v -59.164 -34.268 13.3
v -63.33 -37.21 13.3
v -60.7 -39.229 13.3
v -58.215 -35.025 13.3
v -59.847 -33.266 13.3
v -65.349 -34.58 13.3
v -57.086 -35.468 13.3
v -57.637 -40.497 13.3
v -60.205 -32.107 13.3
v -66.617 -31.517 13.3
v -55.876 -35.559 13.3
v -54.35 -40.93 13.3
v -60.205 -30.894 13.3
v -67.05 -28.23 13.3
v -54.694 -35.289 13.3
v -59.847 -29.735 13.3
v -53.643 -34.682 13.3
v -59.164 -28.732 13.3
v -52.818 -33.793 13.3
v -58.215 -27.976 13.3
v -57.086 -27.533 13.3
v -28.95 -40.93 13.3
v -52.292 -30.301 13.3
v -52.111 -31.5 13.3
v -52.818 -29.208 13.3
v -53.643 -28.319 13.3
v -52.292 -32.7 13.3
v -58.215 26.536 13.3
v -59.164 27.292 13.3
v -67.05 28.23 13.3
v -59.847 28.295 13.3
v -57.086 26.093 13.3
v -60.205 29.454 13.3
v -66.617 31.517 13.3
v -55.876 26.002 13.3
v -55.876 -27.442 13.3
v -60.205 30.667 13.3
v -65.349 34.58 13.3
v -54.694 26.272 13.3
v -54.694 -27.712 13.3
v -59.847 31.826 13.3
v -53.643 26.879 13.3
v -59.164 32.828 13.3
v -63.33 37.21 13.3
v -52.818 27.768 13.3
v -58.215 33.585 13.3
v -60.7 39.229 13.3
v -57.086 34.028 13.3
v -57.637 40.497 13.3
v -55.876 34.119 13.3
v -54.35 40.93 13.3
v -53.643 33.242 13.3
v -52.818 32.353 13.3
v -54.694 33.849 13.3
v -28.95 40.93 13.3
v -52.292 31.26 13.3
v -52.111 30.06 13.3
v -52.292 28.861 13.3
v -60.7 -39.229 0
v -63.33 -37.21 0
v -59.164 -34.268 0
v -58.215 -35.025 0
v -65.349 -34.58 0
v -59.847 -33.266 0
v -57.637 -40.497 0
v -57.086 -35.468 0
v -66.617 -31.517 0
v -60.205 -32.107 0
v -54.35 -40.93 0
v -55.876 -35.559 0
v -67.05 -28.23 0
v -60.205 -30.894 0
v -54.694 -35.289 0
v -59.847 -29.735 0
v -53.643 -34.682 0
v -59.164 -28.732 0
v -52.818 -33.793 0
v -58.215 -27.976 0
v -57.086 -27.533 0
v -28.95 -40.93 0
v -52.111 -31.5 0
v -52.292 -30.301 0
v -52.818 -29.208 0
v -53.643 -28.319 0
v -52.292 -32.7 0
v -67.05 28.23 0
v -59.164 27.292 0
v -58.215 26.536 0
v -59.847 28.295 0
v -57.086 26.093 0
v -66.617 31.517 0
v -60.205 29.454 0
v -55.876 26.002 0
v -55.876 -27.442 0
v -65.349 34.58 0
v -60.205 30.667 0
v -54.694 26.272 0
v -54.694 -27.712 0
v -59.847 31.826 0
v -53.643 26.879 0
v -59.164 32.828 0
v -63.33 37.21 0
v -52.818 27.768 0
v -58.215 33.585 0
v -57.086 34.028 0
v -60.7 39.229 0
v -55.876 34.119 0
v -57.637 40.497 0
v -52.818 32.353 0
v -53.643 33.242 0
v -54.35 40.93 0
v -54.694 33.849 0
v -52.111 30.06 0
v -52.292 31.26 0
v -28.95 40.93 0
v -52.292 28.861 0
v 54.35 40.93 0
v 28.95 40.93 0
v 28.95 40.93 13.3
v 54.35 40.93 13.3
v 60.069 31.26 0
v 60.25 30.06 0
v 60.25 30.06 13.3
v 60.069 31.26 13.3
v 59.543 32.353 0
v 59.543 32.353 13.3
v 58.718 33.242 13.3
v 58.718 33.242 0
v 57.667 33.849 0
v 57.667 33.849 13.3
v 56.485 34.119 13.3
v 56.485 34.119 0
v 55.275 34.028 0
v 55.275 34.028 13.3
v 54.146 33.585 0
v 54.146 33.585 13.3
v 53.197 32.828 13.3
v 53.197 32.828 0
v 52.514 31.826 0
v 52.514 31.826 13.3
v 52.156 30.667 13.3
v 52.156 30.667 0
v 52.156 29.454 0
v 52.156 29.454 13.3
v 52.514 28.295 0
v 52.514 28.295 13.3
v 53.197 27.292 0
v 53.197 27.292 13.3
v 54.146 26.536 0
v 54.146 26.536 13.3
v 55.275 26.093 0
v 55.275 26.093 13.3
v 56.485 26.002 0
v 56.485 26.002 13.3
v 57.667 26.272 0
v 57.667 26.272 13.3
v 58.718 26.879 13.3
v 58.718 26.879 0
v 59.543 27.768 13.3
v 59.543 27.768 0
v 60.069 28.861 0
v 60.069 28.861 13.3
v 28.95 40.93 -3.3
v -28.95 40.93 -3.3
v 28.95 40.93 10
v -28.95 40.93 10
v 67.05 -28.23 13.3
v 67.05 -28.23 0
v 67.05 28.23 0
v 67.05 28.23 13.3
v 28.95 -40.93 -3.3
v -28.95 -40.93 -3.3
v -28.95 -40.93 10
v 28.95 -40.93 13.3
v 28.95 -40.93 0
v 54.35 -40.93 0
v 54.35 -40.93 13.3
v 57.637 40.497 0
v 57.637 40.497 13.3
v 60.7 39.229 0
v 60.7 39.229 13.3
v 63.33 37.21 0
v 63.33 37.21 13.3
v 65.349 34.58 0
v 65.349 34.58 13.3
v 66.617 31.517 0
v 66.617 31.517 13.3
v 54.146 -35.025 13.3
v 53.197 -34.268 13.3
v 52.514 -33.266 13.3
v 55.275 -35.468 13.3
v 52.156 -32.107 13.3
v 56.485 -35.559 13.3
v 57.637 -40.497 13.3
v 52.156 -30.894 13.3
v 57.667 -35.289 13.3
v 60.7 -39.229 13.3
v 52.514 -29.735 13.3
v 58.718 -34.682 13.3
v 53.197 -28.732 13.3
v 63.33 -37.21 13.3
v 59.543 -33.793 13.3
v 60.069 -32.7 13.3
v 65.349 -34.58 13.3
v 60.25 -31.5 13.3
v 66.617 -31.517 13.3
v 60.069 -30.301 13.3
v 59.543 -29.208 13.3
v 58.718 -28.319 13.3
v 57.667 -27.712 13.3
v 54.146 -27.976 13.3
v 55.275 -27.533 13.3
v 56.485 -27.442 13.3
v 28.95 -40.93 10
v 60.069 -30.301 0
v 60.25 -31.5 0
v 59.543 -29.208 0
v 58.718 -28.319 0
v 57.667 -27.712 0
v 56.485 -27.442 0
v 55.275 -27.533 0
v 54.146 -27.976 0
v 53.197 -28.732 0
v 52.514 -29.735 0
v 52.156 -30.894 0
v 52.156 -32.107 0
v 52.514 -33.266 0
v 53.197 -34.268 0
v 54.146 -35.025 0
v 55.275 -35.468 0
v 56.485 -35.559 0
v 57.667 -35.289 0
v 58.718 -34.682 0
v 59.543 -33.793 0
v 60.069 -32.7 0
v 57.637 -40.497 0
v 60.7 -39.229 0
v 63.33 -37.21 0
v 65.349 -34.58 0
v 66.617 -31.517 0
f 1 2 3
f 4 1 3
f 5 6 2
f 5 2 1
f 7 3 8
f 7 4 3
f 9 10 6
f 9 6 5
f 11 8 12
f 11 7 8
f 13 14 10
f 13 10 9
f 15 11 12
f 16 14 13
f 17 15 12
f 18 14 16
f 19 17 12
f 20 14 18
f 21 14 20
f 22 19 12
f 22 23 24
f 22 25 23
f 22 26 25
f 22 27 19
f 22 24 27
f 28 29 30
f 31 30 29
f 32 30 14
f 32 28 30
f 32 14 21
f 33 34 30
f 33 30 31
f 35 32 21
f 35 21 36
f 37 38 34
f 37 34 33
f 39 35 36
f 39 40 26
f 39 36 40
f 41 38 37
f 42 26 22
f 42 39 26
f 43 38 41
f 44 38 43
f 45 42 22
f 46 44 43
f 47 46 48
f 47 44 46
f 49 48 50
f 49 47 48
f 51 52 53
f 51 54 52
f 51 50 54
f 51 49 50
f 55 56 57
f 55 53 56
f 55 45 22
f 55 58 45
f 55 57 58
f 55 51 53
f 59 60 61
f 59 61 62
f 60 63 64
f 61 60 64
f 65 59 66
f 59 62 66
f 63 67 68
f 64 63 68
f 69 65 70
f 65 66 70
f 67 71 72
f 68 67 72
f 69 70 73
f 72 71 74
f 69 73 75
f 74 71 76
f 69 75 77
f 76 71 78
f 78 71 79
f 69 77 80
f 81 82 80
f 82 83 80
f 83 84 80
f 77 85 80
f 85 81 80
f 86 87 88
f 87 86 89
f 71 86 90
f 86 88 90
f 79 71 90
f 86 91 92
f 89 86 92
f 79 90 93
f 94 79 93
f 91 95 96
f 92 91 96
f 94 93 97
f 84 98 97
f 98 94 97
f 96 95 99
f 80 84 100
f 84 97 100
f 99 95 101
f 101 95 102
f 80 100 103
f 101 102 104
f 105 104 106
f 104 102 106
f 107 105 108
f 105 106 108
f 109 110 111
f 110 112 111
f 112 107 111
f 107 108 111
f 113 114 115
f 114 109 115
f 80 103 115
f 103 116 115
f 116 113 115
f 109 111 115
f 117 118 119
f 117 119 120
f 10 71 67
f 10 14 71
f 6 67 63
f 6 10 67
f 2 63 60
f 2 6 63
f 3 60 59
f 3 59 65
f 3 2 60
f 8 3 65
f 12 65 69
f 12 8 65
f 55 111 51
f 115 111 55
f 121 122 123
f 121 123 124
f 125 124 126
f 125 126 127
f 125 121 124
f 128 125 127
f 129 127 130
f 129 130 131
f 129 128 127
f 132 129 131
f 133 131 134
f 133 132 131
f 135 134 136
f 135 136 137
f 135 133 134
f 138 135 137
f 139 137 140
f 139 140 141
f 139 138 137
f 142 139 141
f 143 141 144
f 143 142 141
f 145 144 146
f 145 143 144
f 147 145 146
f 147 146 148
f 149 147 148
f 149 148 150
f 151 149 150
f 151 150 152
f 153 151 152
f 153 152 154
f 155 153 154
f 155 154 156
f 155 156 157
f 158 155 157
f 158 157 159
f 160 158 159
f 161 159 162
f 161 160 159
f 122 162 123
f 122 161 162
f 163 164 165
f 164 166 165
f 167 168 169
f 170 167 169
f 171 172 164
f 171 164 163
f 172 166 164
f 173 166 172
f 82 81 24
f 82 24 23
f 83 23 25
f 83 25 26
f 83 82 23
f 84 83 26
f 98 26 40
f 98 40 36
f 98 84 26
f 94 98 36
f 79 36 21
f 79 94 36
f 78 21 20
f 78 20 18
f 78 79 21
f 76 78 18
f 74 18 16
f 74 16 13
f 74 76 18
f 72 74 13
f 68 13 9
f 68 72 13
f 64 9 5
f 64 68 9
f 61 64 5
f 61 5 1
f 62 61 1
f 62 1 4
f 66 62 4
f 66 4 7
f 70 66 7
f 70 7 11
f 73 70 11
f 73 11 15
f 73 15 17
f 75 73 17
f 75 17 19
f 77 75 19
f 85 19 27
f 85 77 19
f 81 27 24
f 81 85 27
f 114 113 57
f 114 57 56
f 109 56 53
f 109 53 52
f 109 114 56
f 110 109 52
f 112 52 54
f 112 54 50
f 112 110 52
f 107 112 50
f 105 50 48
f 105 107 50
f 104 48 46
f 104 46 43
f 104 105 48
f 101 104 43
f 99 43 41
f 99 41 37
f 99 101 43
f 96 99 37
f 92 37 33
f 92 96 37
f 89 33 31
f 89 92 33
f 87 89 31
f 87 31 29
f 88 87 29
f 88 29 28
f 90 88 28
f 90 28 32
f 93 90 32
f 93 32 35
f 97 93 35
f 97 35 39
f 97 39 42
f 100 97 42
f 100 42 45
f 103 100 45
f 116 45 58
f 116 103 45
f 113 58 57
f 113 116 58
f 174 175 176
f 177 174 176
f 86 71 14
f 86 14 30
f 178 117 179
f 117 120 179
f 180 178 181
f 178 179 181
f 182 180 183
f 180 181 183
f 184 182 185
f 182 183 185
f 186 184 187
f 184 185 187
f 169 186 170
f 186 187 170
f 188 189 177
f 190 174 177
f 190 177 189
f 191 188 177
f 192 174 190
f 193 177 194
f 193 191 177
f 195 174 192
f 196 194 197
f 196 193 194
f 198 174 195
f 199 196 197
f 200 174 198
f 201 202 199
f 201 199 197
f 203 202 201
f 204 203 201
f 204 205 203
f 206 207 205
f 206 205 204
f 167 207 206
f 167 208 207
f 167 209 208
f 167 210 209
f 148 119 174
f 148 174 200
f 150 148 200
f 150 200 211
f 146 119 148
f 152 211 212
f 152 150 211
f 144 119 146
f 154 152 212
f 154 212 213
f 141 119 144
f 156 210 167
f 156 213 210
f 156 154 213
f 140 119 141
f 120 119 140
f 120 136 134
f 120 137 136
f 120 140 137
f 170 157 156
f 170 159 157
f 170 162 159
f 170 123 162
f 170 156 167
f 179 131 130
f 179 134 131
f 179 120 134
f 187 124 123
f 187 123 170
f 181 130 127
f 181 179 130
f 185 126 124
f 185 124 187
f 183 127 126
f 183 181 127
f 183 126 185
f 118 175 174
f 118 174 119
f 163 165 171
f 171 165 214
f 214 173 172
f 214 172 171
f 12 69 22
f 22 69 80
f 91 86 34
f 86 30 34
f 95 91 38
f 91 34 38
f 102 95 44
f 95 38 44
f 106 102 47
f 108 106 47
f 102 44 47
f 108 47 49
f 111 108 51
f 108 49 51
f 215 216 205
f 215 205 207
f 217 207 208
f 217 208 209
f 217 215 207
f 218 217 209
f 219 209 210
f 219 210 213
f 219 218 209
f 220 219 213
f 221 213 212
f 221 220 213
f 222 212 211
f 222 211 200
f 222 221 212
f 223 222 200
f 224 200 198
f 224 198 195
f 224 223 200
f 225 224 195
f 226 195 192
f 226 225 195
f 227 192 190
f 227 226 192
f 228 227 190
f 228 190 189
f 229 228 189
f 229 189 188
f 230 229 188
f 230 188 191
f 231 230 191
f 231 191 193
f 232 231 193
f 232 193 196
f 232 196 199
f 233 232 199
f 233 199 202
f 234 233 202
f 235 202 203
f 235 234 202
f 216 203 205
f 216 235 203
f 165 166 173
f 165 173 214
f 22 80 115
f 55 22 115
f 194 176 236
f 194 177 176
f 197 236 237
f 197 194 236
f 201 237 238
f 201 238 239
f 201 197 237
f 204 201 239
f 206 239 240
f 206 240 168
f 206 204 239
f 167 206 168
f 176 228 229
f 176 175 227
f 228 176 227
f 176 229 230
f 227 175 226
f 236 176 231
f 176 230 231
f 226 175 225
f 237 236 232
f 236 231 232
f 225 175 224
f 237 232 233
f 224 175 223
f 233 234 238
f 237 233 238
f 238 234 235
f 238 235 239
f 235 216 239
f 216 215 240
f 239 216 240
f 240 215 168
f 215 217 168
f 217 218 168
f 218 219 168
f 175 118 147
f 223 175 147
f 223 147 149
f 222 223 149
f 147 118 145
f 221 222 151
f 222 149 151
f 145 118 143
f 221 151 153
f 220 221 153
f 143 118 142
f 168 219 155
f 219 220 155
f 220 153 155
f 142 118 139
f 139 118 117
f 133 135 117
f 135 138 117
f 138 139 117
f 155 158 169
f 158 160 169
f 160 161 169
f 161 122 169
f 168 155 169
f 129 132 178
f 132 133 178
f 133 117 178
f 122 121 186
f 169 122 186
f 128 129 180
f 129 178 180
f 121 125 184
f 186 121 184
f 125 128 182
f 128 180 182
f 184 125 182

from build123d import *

# Parameters (mm, degrees)
F0_W     = 38.1
F0_H     = 81.86
F0_R     = 4.0695268365
F1_DEPTH = 13.3
F0_W_2   = 28.95
F2_DEPTH = 10
F3_W     = 57.9
F3_H     = 81.86
F4_DEPTH = 3.3
F5_R     = 12.7
F5_2_R   = 12.7


with BuildPart() as f1:
    # F0 (on Top) → F1 (new body)
    with BuildSketch(Plane.XY):
        with Locations((-48, 0)):
            Rectangle(F0_W, F0_H)
        with Locations((-56.1804731635, -31.5004731635)):
            Circle(F0_R, mode=Mode.SUBTRACT)
        with Locations((-56.1804731635, 30.0604731635)):
            Circle(F0_R, mode=Mode.SUBTRACT)
    extrude(amount=F1_DEPTH)

    # F5
    f5_edges = [f1.edges().sort_by_distance(p)[0] for p in [
        (-67.05, 40.93, 6.65),
        (-67.05, -40.93, 6.65),
    ]]
    fillet(f5_edges, radius=F5_R)


with BuildPart() as f1b:
    # F0 (on Top) → F1, piece 2 (new body)
    with BuildSketch(Plane.XY):
        with Locations((48, 0)):
            Rectangle(F0_W, F0_H)
        with Locations((56.1804731635, -31.5004731635)):
            Circle(F0_R, mode=Mode.SUBTRACT)
        with Locations((56.1804731635, 30.0604731635)):
            Circle(F0_R, mode=Mode.SUBTRACT)
    extrude(amount=F1_DEPTH)

    # F5#2
    f5_2_edges = [f1b.edges().sort_by_distance(p)[0] for p in [
        (67.05, -40.93, 6.65),
        (67.05, 40.93, 6.65),
    ]]
    fillet(f5_2_edges, radius=F5_2_R)


with BuildPart() as f2:
    # F0 (on Top) → F2 (new body)
    with BuildSketch(Plane.XY):
        with Locations((14.475, 0)):
            Rectangle(F0_W_2, F0_H)
        with Locations((-14.475, 0)):
            Rectangle(F0_W_2, F0_H)
    extrude(amount=F2_DEPTH)

    # F3 (on face) → F4 (join)
    with BuildSketch(Plane(origin=(0, 0, 0), x_dir=(1, 0, 0), z_dir=(0, 0, -1))):
        Rectangle(F3_W, F3_H)
    extrude(amount=F4_DEPTH)


solid = Compound([f1.part, f1b.part, f2.part])
